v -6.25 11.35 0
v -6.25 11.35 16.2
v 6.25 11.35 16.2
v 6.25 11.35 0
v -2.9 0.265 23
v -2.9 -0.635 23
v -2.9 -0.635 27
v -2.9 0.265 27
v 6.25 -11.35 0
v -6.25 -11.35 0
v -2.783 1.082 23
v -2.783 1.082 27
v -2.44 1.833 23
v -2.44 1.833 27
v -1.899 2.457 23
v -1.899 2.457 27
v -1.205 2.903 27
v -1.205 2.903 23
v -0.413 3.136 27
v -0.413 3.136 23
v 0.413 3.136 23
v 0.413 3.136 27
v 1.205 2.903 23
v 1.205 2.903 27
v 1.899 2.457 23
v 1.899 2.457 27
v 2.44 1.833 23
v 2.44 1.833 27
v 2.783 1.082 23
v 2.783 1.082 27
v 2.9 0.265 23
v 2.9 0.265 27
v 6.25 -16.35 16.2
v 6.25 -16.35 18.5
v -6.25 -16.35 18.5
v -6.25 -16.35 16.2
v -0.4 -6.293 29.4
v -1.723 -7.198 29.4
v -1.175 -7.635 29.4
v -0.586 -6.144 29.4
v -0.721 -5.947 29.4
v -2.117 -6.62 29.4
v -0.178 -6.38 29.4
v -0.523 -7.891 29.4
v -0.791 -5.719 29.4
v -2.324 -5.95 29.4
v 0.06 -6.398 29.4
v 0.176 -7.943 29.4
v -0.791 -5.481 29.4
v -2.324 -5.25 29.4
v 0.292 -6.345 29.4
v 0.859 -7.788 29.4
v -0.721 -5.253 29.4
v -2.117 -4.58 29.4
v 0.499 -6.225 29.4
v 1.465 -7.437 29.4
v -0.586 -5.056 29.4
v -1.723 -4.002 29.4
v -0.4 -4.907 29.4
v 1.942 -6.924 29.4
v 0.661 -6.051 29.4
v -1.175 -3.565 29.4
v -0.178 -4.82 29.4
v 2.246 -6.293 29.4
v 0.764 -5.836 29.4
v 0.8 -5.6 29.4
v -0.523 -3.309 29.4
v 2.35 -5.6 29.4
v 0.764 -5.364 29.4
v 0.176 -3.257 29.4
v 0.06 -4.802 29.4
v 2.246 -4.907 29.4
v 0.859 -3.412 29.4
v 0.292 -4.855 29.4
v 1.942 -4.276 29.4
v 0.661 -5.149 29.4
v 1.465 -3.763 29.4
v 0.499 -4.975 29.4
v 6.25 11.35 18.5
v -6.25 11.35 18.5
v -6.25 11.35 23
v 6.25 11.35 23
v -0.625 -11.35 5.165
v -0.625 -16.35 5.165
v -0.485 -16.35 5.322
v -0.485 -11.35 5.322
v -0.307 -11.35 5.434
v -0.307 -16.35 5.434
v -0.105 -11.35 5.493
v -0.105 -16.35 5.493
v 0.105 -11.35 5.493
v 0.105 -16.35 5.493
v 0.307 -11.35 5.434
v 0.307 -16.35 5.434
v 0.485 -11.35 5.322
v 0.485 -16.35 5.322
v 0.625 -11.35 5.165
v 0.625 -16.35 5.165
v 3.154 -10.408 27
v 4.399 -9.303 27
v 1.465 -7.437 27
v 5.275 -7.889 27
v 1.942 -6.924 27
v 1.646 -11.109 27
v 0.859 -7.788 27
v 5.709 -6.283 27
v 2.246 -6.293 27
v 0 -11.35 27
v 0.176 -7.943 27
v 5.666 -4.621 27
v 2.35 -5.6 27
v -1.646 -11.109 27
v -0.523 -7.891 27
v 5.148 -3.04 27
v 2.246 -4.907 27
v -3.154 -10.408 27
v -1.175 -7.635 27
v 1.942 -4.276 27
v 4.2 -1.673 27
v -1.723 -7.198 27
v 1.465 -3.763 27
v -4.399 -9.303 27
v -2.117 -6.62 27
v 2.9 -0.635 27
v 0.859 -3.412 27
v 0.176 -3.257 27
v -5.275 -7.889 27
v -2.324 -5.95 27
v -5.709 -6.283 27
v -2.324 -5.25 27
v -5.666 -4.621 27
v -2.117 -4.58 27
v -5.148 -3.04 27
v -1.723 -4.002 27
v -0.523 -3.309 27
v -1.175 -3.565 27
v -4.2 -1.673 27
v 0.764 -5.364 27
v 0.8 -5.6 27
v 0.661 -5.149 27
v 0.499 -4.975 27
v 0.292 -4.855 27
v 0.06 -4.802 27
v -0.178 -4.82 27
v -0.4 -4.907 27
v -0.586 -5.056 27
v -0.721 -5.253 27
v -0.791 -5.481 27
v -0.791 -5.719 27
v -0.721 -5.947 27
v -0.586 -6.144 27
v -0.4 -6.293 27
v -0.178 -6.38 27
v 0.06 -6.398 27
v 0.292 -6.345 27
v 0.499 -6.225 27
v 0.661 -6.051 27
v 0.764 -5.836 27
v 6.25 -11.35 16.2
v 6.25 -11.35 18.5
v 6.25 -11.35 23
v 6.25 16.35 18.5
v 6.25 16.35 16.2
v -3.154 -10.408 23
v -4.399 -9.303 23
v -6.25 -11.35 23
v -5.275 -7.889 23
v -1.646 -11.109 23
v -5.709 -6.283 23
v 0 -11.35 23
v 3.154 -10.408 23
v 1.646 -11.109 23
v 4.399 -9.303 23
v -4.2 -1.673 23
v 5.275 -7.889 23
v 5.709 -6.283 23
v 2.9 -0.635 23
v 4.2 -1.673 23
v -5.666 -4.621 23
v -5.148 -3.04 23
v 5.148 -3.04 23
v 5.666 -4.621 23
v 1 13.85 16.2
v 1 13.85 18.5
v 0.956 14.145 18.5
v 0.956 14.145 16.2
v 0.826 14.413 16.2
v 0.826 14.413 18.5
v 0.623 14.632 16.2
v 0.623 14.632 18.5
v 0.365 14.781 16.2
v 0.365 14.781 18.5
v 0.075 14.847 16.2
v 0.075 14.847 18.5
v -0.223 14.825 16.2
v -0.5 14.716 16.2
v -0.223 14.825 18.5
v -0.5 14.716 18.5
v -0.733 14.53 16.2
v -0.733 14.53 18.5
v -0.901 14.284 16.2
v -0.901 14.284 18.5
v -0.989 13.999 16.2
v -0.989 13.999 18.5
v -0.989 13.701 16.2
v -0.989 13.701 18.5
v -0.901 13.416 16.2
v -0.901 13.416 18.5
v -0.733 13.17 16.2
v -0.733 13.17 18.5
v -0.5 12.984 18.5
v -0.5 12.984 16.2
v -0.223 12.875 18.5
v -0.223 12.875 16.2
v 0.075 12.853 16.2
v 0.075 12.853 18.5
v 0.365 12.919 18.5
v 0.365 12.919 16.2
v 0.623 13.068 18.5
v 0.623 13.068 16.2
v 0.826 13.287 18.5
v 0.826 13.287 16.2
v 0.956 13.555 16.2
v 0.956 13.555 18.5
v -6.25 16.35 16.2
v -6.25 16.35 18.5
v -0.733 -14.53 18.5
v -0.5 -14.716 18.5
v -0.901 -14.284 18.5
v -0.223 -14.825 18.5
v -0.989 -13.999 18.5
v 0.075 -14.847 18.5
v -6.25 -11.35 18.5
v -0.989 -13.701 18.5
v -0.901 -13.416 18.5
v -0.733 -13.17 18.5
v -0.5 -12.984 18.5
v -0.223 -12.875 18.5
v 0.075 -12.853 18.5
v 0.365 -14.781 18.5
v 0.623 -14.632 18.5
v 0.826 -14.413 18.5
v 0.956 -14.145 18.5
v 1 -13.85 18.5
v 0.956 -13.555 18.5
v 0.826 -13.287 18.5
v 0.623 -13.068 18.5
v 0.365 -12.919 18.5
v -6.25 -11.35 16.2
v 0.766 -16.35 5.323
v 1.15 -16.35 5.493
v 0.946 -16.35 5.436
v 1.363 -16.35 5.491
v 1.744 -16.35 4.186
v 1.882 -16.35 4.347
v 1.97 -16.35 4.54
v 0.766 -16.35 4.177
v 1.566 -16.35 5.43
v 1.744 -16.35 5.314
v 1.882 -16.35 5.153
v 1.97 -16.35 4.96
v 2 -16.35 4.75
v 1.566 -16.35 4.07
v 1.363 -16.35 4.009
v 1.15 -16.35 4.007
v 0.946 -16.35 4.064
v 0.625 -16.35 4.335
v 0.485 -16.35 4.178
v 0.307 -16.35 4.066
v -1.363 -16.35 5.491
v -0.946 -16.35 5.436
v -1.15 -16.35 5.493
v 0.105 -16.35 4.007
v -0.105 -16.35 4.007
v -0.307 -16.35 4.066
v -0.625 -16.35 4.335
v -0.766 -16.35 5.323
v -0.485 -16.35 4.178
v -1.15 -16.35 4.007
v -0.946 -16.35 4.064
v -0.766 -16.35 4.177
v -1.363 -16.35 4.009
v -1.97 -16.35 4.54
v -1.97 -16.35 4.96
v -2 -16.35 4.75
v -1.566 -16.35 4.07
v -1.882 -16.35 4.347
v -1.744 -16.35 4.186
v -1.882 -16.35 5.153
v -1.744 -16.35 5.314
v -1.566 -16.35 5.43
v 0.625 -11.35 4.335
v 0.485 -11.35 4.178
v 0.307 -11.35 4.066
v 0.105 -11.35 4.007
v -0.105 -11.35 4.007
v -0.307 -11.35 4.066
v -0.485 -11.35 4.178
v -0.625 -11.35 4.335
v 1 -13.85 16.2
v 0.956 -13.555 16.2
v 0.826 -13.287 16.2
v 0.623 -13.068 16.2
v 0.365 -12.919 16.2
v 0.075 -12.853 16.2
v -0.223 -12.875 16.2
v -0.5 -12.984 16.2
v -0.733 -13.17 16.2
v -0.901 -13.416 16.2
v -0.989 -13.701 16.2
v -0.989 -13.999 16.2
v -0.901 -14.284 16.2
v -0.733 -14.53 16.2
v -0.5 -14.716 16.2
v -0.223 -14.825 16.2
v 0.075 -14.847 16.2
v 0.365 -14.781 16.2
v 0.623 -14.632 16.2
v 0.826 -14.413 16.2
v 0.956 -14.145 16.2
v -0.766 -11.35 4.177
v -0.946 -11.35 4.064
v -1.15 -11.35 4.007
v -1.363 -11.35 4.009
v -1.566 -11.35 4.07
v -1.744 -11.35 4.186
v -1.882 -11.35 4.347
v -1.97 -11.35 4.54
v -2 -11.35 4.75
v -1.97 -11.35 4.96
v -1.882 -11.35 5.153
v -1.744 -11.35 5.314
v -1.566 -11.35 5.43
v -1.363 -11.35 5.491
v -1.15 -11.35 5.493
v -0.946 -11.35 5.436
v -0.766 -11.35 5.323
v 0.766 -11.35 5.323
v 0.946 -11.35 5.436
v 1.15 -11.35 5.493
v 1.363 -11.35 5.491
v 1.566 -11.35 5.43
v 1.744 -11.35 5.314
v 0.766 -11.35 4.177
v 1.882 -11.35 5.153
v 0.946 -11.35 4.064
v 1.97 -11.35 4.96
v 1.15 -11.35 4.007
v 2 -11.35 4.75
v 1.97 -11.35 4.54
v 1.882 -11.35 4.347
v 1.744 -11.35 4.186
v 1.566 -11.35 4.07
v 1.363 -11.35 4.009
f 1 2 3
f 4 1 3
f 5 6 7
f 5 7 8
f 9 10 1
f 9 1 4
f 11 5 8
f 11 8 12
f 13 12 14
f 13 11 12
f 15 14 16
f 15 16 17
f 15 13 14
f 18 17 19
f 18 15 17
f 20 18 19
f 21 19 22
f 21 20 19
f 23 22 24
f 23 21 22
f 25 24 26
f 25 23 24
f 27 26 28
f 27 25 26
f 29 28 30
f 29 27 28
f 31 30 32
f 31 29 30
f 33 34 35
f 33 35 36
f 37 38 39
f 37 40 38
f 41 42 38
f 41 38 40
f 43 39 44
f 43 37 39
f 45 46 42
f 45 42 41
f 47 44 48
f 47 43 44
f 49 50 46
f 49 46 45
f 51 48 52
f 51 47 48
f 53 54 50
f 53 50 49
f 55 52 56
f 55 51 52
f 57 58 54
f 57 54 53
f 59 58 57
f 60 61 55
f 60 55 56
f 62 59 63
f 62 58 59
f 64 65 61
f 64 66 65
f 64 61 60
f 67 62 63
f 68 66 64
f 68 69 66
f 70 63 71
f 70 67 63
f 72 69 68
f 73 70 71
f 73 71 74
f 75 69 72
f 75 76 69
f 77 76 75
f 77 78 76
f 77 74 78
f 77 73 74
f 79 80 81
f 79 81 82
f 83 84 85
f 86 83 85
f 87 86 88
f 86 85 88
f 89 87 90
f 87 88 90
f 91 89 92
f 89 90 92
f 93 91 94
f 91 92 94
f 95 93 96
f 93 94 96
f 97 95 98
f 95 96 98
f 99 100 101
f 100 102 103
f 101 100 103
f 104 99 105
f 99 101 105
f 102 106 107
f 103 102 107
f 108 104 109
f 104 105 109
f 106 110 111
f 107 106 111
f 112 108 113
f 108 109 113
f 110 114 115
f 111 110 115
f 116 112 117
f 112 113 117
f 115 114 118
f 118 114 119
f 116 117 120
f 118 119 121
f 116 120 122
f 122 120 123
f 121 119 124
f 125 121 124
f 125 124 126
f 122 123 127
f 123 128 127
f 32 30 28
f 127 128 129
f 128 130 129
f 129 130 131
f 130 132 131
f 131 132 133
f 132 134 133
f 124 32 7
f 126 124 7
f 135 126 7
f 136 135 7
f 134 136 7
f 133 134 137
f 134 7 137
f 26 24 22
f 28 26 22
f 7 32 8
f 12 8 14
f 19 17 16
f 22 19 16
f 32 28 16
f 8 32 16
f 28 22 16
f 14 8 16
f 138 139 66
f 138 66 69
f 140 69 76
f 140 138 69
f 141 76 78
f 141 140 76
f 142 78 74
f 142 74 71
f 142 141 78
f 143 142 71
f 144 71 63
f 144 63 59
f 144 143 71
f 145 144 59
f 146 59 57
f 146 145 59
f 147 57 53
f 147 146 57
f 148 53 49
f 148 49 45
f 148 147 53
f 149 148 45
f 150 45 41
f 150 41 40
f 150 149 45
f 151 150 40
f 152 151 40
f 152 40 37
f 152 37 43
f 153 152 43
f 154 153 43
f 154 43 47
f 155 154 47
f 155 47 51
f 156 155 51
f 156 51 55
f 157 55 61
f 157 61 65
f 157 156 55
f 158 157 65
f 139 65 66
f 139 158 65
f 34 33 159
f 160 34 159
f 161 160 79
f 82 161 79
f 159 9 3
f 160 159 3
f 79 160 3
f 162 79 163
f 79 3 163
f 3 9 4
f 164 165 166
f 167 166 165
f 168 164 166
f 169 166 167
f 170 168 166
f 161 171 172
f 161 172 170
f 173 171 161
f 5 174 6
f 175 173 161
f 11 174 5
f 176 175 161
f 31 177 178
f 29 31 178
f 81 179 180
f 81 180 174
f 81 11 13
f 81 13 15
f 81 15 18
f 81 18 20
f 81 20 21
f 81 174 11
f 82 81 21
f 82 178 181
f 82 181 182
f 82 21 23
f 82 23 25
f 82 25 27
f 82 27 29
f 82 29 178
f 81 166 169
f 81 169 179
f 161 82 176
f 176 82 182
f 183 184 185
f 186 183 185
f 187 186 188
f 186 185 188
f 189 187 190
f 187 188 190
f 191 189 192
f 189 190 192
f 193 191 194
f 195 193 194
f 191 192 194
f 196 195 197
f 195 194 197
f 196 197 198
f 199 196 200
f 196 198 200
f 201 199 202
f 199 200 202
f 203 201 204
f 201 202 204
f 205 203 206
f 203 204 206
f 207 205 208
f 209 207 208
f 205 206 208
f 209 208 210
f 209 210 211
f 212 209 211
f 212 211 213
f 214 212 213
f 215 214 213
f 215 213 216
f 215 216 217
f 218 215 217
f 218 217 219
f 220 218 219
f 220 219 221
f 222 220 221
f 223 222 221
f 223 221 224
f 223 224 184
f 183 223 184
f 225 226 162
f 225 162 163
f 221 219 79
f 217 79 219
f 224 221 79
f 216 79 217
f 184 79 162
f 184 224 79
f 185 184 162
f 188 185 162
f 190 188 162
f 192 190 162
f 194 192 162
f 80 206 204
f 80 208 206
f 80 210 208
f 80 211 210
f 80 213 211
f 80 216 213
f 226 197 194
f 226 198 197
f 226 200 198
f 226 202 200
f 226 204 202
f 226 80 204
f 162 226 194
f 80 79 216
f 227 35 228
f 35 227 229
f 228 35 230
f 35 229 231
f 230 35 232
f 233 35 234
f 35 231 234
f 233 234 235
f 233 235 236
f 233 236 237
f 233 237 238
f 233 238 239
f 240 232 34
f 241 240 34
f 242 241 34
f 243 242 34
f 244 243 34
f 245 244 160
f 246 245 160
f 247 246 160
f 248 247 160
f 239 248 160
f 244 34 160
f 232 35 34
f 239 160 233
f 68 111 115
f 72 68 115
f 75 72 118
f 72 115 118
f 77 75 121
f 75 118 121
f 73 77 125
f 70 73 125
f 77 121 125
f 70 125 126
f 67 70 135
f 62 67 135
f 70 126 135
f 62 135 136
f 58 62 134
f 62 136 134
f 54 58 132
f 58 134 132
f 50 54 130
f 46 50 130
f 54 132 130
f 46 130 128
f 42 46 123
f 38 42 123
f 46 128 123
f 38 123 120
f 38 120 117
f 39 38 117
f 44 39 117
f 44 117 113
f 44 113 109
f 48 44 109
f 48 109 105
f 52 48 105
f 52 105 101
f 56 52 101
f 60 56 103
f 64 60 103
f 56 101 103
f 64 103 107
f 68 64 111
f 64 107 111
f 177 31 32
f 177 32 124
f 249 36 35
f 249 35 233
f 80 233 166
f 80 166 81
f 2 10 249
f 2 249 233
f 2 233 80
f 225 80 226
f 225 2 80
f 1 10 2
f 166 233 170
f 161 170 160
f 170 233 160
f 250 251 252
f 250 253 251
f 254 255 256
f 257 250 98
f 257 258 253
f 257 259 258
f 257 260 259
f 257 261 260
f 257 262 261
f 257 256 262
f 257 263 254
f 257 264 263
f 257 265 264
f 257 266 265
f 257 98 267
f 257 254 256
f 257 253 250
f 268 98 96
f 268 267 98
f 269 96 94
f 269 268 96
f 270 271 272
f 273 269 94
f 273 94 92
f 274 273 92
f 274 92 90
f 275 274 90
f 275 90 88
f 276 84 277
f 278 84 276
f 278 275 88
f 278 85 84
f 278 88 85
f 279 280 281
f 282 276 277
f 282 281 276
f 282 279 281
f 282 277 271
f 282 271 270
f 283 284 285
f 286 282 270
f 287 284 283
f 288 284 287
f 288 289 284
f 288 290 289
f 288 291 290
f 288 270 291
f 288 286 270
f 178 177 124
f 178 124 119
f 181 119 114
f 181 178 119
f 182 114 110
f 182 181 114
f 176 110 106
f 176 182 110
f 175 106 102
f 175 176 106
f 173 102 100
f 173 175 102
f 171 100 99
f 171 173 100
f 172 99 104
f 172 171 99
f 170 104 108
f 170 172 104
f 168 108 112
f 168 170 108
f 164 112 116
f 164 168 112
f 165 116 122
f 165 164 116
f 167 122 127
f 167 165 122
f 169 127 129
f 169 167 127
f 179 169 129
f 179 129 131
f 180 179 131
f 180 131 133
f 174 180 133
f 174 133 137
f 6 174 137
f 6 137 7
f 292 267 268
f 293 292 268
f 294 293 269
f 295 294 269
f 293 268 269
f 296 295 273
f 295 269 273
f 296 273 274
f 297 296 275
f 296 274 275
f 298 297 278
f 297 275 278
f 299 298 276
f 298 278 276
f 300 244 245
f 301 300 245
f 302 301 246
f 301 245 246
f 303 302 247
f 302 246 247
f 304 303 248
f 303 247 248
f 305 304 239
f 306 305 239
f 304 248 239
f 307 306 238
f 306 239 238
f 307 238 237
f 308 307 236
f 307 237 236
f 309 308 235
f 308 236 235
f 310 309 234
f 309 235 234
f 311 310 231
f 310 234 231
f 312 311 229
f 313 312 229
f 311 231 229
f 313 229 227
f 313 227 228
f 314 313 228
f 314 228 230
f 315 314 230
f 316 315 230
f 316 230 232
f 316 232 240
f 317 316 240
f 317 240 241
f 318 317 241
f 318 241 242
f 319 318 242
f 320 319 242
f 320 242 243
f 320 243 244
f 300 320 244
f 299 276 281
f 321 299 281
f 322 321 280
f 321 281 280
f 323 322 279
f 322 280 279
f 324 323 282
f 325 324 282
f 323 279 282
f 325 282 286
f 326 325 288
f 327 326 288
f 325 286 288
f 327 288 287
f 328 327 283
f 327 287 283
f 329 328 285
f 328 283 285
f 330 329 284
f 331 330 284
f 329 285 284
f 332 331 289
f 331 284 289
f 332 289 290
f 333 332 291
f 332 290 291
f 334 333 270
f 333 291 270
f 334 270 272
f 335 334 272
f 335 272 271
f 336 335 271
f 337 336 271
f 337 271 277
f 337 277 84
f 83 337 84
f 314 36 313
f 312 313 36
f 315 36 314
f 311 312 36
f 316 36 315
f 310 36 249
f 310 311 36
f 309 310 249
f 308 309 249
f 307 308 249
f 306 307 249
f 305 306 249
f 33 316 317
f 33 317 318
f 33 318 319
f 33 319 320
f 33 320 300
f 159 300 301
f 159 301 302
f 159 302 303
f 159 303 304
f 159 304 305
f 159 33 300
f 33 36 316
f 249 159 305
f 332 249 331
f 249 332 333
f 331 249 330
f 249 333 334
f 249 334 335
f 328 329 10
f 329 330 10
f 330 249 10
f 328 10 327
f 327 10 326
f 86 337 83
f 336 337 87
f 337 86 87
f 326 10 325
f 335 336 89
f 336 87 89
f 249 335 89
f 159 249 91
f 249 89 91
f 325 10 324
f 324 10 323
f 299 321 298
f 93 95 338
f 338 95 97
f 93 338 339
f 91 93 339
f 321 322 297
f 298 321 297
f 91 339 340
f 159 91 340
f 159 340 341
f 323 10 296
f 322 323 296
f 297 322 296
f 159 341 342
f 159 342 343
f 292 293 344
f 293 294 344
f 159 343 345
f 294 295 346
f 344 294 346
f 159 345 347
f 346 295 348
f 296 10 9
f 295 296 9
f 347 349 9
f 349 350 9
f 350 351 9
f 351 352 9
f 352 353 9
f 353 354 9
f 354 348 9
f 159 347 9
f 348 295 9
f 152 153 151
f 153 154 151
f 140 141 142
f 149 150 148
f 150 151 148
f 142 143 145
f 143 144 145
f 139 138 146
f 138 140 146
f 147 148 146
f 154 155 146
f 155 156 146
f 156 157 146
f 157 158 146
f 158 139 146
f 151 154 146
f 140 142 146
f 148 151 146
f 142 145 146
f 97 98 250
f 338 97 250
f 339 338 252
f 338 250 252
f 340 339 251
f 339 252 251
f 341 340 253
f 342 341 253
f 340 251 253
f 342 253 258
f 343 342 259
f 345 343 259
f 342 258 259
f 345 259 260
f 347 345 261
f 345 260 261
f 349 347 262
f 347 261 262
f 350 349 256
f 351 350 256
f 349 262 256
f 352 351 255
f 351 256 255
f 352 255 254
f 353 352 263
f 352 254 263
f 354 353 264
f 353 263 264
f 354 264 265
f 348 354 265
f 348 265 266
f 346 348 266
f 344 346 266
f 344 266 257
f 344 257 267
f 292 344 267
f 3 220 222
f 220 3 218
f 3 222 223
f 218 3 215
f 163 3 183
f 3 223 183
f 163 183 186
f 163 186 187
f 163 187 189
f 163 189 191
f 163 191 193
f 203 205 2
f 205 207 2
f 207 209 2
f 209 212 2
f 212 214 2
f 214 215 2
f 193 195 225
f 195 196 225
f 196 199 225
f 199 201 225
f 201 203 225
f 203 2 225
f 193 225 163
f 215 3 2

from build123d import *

# Parameters (mm, degrees)
CROQUIS1_W              = 12.5
CROQUIS1_H              = 22.7
SALIENTE_EXTRUIR1_DEPTH = 23
SALIENTE_EXTRUIR2_DEPTH = 4
CROQUIS3_W              = 2.3
CROQUIS3_H              = 5
SALIENTE_EXTRUIR3_DEPTH = 6.25
CORTAR_EXTRUIR1_REACH   = 20.5
CROQUIS4_R              = 1
SALIENTE_EXTRUIR4_START = -4
CROQUIS5_W              = 4
CROQUIS5_H              = 5
SALIENTE_EXTRUIR4_DEPTH = 1.5
CROQUIS6_R              = 2.35
CROQUIS6_R_2            = 0.8
SALIENTE_EXTRUIR5_DEPTH = 2.4
SKETCH1_W               = 4.514706964
SKETCH1_H               = 2.103718672
CUT_EXTRUDE2_DEPTH      = 5


with BuildPart() as part:
    # Croquis1 → Saliente-Extruir1 (new body)
    with BuildSketch(Plane.XY):
        Rectangle(CROQUIS1_W, CROQUIS1_H)
    extrude(amount=SALIENTE_EXTRUIR1_DEPTH)

    # Croquis2 → Saliente-Extruir2 (add)
    with BuildSketch(Plane.XY.offset(23)):
        with BuildLine():
            Line((2.9, 0.265128397), (2.9, -0.634871603))
            ThreePointArc((2.9, -0.634871603), (0, -11.35), (-2.9, -0.634871603))
            Line((-2.9, -0.634871603), (-2.9, 0.265128397))
            ThreePointArc((-2.9, 0.265128397), (0, 3.165128397), (2.9, 0.265128397))
        make_face()
    extrude(amount=SALIENTE_EXTRUIR2_DEPTH)

    # Croquis3 → Saliente-Extruir3 (add, symmetric)
    with BuildSketch(Plane(origin=(0, 0, 0), x_dir=(0, 0, -1), z_dir=(1, 0, 0))):
        with Locations((-17.35, 13.85)):
            Rectangle(CROQUIS3_W, CROQUIS3_H)
        with Locations((-17.35, -13.85)):
            Rectangle(CROQUIS3_W, CROQUIS3_H)
    extrude(amount=SALIENTE_EXTRUIR3_DEPTH, both=True)

    # Croquis4 → Cortar-Extruir1 (cut, up to next)
    with BuildSketch(Plane.XY.offset(18.5), mode=Mode.PRIVATE) as cortar_extruir1_sk1:
        with Locations((0, 13.85)):
            Circle(CROQUIS4_R)
    cortar_extruir1_tool1 = extrude(cortar_extruir1_sk1.sketch, amount=-CORTAR_EXTRUIR1_REACH, mode=Mode.PRIVATE) & part.part
    add(cortar_extruir1_tool1.solids().sort_by_distance((0, 13.85, 18.5))[0], mode=Mode.SUBTRACT)
    # Croquis4 → Cortar-Extruir1 (cut, up to next)
    with BuildSketch(Plane.XY.offset(18.5), mode=Mode.PRIVATE) as cortar_extruir1_sk2:
        with Locations((0, -13.85)):
            Circle(CROQUIS4_R)
    cortar_extruir1_tool2 = extrude(cortar_extruir1_sk2.sketch, amount=-CORTAR_EXTRUIR1_REACH, mode=Mode.PRIVATE) & part.part
    add(cortar_extruir1_tool2.solids().sort_by_distance((0, -13.85, 18.5))[0], mode=Mode.SUBTRACT)

    # Croquis5 → Saliente-Extruir4 (add)
    with BuildSketch(Plane(origin=(0, 0, 0), x_dir=(-1, 0, 0), z_dir=(0, 0, -1)).offset(SALIENTE_EXTRUIR4_START)):
        with Locations((0, -13.85)):
            Rectangle(CROQUIS5_W, CROQUIS5_H)
    extrude(amount=-SALIENTE_EXTRUIR4_DEPTH)

    # Croquis6 → Saliente-Extruir5 (add)
    with BuildSketch(Plane.XY.offset(27)):
        with Locations((0, -5.6)):
            Circle(CROQUIS6_R)
        with Locations((0, -5.6)):
            Circle(CROQUIS6_R_2, mode=Mode.SUBTRACT)
    extrude(amount=SALIENTE_EXTRUIR5_DEPTH)

    # Sketch1 → Cut-Extrude2 (cut)
    with BuildSketch(Plane.XZ.offset(16.35)):
        with Locations((0, 4.75)):
            Rectangle(SKETCH1_W, SKETCH1_H)
        with BuildLine():
            ThreePointArc((-0.625, 4.335421901), (-2, 4.75), (-0.625, 5.164578099))
            ThreePointArc((-0.625, 5.164578099), (0, 5.5), (0.625, 5.164578099))
            ThreePointArc((0.625, 5.164578099), (2, 4.75), (0.625, 4.335421901))
            ThreePointArc((0.625, 4.335421901), (0, 4), (-0.625, 4.335421901))
        make_face(mode=Mode.SUBTRACT)
    extrude(amount=-CUT_EXTRUDE2_DEPTH, mode=Mode.SUBTRACT)


solid = part.part
